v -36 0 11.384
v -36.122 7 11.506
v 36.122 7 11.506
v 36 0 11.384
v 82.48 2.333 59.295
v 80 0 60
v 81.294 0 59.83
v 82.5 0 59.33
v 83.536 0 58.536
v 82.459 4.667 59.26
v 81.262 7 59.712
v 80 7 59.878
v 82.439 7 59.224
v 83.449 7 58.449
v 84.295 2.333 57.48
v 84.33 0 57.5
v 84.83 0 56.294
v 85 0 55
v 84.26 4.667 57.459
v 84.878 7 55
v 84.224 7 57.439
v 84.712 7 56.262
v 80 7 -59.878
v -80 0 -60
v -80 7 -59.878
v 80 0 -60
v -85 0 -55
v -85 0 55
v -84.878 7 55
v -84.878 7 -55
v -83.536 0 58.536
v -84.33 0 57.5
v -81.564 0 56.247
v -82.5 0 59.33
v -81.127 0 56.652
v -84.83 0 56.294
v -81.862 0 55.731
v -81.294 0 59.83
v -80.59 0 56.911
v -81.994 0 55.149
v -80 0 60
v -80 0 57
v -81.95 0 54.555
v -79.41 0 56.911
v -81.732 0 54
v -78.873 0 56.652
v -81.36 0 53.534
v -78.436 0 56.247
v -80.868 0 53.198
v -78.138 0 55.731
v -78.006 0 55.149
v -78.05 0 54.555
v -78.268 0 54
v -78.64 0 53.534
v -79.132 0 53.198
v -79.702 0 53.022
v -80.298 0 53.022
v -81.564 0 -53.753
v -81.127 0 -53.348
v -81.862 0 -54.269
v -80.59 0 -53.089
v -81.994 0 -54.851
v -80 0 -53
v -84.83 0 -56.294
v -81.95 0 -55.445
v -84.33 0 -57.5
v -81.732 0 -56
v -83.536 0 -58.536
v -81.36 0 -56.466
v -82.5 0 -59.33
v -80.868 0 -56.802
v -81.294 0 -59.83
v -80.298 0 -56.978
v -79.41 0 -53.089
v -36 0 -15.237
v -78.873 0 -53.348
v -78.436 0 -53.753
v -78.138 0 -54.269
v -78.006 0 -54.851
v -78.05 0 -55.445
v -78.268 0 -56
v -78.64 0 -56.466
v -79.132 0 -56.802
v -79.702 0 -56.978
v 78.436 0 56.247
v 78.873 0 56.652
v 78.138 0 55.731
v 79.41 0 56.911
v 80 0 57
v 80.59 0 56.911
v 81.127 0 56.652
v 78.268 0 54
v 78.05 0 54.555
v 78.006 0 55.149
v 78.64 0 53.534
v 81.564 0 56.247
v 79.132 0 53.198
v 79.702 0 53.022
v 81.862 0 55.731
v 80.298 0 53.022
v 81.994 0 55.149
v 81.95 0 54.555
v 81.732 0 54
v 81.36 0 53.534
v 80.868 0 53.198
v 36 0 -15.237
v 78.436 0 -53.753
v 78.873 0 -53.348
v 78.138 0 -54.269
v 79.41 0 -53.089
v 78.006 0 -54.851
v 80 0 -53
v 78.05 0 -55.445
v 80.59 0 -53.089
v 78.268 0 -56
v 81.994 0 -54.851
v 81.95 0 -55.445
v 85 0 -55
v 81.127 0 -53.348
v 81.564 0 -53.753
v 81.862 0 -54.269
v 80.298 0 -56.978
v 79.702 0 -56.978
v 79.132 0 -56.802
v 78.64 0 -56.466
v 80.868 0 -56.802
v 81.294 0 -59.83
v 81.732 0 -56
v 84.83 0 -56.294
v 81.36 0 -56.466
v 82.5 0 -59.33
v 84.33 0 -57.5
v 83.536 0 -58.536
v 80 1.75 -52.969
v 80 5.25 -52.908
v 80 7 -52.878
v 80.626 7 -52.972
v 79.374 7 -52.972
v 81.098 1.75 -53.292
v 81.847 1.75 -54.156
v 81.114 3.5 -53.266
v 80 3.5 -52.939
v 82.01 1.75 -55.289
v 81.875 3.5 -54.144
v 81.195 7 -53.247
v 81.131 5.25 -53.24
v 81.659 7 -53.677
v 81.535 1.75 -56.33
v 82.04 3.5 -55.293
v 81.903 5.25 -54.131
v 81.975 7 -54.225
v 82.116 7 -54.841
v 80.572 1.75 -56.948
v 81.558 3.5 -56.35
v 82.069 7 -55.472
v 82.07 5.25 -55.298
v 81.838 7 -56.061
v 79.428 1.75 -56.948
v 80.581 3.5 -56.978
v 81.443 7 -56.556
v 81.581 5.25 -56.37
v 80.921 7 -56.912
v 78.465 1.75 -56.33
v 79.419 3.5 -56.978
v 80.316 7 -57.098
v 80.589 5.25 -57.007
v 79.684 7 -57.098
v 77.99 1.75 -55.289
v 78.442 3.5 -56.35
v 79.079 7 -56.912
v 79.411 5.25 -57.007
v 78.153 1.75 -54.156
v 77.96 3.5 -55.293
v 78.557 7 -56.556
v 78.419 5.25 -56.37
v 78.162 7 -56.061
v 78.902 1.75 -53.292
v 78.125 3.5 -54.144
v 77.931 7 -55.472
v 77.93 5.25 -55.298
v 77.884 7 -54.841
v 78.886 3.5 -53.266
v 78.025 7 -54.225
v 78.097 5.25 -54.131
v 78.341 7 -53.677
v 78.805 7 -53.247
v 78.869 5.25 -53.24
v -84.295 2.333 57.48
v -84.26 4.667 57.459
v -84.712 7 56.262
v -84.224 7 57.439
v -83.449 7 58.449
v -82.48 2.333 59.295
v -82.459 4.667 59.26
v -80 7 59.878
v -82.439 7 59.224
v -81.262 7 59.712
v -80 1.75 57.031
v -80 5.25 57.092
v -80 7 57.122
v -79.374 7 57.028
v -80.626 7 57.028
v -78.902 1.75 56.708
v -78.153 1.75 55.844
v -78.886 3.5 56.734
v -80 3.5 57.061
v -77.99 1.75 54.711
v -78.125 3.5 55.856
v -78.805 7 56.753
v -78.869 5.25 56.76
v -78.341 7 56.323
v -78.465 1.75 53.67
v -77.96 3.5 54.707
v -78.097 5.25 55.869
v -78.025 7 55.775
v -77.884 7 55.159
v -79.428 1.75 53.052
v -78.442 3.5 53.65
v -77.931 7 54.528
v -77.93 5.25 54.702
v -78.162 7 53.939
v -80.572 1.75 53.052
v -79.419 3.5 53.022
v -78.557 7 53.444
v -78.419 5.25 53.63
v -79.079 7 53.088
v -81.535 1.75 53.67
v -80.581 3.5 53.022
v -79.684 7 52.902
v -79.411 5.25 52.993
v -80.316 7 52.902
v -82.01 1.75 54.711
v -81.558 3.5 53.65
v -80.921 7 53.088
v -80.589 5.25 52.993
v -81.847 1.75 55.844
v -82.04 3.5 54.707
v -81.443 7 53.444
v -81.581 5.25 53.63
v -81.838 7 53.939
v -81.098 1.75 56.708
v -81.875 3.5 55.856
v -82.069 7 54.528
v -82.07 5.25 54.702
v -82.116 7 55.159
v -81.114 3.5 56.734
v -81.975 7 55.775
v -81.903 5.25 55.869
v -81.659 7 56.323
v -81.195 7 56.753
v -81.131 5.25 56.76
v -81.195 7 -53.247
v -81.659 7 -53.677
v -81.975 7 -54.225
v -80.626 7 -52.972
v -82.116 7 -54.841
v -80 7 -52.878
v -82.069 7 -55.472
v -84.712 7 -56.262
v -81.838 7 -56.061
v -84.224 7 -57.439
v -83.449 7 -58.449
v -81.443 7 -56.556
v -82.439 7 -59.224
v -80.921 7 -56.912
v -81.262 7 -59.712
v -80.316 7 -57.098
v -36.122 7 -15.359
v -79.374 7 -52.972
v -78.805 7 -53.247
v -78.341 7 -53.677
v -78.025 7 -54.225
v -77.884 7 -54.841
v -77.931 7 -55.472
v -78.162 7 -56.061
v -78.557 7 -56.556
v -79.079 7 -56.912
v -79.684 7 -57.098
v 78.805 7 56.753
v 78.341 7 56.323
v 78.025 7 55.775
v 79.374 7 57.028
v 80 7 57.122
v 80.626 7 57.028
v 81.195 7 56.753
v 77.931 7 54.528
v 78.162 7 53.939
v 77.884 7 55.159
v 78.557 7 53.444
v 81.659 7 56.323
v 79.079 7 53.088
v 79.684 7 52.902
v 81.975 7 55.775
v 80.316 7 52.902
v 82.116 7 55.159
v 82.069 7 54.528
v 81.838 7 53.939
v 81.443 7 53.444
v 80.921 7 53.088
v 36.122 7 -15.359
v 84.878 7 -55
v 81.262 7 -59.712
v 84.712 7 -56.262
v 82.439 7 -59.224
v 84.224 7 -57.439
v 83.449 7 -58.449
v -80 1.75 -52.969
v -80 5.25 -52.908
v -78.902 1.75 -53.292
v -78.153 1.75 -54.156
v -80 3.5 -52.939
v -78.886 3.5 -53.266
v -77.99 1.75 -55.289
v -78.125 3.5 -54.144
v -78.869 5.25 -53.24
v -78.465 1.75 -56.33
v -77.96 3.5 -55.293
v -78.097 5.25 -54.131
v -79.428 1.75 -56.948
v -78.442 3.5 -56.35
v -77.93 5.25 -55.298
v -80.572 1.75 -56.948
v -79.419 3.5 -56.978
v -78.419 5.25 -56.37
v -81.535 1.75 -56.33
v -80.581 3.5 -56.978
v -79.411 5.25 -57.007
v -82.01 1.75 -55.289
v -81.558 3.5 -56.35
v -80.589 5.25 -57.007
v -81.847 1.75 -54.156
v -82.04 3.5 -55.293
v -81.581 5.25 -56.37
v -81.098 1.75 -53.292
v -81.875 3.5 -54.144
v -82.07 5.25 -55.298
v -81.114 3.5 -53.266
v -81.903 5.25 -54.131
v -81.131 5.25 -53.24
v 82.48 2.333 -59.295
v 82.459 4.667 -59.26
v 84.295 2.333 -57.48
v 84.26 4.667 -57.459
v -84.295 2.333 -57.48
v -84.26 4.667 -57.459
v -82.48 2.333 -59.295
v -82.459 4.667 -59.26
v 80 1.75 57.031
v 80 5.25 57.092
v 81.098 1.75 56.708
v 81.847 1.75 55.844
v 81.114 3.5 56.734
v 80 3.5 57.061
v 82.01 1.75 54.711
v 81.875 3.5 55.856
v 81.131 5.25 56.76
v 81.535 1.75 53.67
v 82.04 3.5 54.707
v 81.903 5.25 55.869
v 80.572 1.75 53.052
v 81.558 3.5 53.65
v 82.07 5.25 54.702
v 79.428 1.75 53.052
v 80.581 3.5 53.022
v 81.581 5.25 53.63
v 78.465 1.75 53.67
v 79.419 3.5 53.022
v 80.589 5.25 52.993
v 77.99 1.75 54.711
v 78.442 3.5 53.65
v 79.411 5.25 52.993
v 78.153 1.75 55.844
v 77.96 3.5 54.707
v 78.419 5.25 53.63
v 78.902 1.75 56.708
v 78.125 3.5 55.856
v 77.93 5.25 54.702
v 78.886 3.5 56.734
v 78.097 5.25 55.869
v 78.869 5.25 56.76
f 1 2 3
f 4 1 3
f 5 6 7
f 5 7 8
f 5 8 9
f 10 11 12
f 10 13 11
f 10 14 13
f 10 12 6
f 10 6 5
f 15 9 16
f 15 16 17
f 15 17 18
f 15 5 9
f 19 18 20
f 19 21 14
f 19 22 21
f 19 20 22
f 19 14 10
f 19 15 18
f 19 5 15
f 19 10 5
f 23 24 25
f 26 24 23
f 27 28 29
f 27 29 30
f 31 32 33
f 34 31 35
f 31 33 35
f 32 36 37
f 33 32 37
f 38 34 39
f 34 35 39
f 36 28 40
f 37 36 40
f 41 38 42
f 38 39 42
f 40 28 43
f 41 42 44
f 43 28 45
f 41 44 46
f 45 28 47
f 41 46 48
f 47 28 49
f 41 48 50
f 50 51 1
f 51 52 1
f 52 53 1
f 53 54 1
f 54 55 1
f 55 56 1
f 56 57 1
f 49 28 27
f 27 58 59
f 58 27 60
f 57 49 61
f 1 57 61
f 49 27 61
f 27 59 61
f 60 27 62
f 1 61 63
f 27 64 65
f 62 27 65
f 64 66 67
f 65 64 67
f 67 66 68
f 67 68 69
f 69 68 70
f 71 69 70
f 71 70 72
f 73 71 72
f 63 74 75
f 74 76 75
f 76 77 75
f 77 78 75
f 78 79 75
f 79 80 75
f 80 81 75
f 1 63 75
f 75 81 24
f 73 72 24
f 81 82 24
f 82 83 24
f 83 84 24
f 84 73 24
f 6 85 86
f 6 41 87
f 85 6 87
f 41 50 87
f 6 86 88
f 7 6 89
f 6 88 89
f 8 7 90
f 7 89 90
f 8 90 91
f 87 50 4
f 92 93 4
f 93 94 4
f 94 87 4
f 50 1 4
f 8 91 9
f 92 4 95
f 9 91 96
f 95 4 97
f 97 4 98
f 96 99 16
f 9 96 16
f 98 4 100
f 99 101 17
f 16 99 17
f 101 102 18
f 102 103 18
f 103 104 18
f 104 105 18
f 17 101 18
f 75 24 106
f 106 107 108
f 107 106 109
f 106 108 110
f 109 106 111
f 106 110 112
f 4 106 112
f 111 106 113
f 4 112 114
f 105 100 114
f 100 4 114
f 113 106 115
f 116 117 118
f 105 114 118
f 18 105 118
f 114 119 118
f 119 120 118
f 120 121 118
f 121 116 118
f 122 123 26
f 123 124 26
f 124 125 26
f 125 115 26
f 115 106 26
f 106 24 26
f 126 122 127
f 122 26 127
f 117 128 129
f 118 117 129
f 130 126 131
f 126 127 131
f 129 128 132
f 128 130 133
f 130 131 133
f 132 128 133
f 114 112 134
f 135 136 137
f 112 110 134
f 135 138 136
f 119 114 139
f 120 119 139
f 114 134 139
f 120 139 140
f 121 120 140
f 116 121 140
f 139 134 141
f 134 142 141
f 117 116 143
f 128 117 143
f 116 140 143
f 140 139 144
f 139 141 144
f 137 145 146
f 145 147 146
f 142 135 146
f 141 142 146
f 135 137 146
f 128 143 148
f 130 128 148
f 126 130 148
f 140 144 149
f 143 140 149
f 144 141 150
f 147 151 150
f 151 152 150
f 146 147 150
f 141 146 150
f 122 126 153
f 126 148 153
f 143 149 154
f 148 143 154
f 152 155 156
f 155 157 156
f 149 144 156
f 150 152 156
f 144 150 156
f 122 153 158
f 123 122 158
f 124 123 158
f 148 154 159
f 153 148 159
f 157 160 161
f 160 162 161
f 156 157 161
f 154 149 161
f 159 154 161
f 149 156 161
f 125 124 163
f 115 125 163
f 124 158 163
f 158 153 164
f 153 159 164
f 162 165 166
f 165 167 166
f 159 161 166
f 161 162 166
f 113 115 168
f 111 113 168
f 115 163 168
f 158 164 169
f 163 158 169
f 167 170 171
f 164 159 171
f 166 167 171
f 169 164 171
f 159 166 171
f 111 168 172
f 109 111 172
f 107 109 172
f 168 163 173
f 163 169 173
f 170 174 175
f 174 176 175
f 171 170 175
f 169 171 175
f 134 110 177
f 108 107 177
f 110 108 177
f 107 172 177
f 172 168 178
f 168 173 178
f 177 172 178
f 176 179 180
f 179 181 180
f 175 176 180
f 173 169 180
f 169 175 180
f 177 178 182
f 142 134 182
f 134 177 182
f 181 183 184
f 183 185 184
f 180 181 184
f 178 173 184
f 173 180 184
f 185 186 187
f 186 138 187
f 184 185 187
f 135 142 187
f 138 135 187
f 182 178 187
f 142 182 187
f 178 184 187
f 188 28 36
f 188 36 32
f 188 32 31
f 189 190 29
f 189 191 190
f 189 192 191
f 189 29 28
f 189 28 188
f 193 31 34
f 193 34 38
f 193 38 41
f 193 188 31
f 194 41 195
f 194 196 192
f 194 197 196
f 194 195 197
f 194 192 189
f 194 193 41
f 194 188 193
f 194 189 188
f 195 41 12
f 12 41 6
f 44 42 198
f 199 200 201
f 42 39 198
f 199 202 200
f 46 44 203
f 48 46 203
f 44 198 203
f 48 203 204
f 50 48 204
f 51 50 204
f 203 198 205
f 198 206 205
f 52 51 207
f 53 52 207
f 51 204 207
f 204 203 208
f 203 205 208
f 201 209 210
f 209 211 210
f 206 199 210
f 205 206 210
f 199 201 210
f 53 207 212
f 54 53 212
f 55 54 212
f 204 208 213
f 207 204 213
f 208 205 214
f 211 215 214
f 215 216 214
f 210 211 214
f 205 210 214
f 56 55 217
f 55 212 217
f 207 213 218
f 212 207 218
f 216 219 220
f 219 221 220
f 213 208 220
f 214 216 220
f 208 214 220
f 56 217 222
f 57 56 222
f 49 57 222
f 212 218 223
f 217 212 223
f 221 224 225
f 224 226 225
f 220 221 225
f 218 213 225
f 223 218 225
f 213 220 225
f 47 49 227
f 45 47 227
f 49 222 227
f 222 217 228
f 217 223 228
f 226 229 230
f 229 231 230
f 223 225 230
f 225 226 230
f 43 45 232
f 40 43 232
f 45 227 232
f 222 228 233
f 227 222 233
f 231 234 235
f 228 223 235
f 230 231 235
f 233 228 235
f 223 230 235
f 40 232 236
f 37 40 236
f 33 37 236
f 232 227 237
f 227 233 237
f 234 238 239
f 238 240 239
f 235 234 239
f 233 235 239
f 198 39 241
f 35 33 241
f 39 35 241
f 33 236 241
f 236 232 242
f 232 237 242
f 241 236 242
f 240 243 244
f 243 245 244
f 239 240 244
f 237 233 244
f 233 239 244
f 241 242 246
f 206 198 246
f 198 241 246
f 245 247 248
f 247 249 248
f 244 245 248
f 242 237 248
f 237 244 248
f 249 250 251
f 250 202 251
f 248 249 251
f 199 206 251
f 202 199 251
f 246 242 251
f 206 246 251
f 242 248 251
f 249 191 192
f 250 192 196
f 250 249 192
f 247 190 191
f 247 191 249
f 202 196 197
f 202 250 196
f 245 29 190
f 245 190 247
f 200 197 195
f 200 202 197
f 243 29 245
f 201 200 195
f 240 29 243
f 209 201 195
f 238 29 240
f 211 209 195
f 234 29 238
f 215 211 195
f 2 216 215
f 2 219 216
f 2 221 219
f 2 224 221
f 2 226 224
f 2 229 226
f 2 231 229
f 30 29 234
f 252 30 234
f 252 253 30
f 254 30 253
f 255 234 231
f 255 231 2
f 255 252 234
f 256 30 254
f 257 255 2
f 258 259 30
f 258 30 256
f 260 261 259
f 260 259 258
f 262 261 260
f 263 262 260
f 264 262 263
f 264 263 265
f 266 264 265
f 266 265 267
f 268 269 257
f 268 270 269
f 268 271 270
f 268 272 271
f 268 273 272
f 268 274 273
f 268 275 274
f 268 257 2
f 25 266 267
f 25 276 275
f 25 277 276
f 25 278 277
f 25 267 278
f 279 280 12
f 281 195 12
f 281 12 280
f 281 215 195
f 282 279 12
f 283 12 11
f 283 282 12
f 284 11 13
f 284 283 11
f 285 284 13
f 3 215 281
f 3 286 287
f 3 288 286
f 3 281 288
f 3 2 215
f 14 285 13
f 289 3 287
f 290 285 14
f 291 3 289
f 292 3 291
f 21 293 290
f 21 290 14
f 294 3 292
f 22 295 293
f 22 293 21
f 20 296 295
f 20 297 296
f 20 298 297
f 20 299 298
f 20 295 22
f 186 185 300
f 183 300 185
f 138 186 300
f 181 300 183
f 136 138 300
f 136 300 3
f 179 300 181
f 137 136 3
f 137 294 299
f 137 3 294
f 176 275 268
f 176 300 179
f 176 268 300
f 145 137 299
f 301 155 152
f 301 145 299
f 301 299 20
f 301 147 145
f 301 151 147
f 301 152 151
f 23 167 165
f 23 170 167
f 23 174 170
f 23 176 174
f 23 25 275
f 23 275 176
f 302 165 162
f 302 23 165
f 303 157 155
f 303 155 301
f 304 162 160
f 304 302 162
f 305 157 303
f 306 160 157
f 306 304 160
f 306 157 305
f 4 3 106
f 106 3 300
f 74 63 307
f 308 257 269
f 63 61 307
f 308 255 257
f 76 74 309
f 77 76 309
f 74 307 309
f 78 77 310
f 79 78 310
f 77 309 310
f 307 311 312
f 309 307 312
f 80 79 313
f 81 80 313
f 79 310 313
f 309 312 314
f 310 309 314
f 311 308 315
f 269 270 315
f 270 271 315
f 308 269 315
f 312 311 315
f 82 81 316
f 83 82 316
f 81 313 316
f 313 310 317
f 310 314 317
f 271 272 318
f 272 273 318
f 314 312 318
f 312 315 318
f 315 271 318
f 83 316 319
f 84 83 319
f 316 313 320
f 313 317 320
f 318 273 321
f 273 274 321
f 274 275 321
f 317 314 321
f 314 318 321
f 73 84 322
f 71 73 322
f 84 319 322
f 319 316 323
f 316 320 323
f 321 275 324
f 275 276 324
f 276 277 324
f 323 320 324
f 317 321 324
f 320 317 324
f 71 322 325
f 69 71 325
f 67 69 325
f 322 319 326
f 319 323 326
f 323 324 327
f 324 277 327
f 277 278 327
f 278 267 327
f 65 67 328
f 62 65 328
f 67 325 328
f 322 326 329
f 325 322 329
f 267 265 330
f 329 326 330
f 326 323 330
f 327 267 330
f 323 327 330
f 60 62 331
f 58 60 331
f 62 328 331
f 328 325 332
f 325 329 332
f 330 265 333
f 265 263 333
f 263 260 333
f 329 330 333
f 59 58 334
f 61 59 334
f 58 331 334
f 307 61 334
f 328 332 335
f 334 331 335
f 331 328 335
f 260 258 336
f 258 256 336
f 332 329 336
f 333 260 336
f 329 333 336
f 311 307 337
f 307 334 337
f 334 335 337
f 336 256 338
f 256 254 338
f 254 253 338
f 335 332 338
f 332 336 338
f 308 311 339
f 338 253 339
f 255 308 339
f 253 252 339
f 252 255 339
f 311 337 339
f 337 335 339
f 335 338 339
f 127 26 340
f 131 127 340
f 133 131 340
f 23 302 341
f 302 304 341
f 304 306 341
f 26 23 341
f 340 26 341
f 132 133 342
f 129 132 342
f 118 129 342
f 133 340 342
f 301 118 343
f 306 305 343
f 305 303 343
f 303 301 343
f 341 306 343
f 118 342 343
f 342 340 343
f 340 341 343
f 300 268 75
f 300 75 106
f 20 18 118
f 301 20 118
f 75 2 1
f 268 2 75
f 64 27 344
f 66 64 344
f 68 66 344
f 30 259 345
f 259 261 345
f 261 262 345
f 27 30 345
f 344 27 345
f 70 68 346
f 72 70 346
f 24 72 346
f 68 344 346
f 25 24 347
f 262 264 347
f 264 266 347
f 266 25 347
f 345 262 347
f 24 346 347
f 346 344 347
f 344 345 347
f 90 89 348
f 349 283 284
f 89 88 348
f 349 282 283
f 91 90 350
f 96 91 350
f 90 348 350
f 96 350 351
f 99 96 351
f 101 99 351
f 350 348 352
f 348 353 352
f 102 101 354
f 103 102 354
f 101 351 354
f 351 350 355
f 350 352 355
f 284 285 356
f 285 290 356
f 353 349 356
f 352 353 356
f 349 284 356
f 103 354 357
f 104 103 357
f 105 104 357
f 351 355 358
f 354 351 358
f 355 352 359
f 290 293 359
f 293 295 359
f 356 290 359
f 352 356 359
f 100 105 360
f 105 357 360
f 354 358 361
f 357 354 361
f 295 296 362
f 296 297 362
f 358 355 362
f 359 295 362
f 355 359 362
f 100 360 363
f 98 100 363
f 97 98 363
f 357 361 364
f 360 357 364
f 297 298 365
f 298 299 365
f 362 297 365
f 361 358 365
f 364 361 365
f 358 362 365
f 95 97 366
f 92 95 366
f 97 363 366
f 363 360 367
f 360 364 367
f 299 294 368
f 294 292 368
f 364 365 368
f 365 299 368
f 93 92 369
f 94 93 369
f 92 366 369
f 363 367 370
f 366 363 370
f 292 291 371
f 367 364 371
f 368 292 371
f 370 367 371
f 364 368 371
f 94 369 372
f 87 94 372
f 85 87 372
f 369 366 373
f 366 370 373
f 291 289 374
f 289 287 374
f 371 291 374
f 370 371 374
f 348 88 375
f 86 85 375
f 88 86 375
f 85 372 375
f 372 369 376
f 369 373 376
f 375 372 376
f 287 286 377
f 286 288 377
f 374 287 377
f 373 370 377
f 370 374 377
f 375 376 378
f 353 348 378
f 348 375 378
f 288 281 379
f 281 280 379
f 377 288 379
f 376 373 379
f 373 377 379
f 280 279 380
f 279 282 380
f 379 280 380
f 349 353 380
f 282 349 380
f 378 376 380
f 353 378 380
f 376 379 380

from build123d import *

# Parameters (mm, degrees)
SKETCH1_W           = 170
SKETCH1_H           = 120
BOSS_EXTRUDE1_DEPTH = 7
SKETCH2_W           = 72
SKETCH2_H           = 26.620567464
CUT_EXTRUDE1_DEPTH  = 7
SKETCH3_R           = 2
CUT_EXTRUDE5_DEPTH  = 7
SKETCH7_R           = 2
CUT_EXTRUDE7_DEPTH  = 10
SKETCH6_R           = 2
CUT_EXTRUDE10_DEPTH = 10
SKETCH9_R           = 2
CUT_EXTRUDE11_DEPTH = 10
FILLET1_R           = 5
DRAFT1_ANGLE        = 1


with BuildPart() as part:
    # Sketch1 → Boss-Extrude1 (new body)
    with BuildSketch(Plane(origin=(0, 0, 0), x_dir=(1, 0, 0), z_dir=(0, 1, 0))):
        Rectangle(SKETCH1_W, SKETCH1_H)
    extrude(amount=BOSS_EXTRUDE1_DEPTH)

    # Sketch2 → Cut-Extrude1 (cut)
    with BuildSketch(Plane(origin=(0, 7, 0), x_dir=(1, 0, 0), z_dir=(0, 1, 0))):
        with Locations((0, 1.926488435)):
            Rectangle(SKETCH2_W, SKETCH2_H)
    extrude(amount=-CUT_EXTRUDE1_DEPTH, mode=Mode.SUBTRACT)

    # Sketch3 → Cut-Extrude5 (cut)
    with BuildSketch(Plane(origin=(0, 7, 0), x_dir=(1, 0, 0), z_dir=(0, 1, 0))):
        with Locations(Location((-80, 55, 0), (0, 0, 270))):
            Circle(SKETCH3_R)
    extrude(amount=-CUT_EXTRUDE5_DEPTH, mode=Mode.SUBTRACT)

    # Sketch7 → Cut-Extrude7 (cut)
    with BuildSketch(Plane(origin=(0, 7, 0), x_dir=(1, 0, 0), z_dir=(0, 1, 0))):
        with Locations(Location((-80, -55, 0), (0, 0, 270))):
            Circle(SKETCH7_R)
    extrude(amount=-CUT_EXTRUDE7_DEPTH, mode=Mode.SUBTRACT)

    # Sketch6 → Cut-Extrude10 (cut)
    with BuildSketch(Plane(origin=(0, 7, 0), x_dir=(1, 0, 0), z_dir=(0, 1, 0))):
        with Locations(Location((80, 55, 0), (0, 0, 270))):
            Circle(SKETCH6_R)
    extrude(amount=-CUT_EXTRUDE10_DEPTH, mode=Mode.SUBTRACT)

    # Sketch9 → Cut-Extrude11 (cut)
    with BuildSketch(Plane(origin=(0, 7, 0), x_dir=(1, 0, 0), z_dir=(0, 1, 0))):
        with Locations(Location((80, -55, 0), (0, 0, 270))):
            Circle(SKETCH9_R)
    extrude(amount=-CUT_EXTRUDE11_DEPTH, mode=Mode.SUBTRACT)

    # Fillet1
    fillet1_edges = [part.edges().sort_by_distance(p)[0] for p in [
        (-85, 3.5, -60),
        (85, 3.5, -60),
        (85, 3.5, 60),
        (-85, 3.5, 60),
    ]]
    fillet(fillet1_edges, radius=FILLET1_R)

    # Draft1
    draft1_faces = [part.faces().sort_by_distance(p)[0] for p in [
        (-83.535533906, 3.5, 58.535533906),
        (-85, 3.5, 0),
        (-83.535533906, 3.5, -58.535533906),
        (0, 3.5, -60),
        (83.535533906, 3.5, -58.535533906),
        (85, 3.5, 0),
        (83.535533906, 3.5, 58.535533906),
        (0, 3.5, 60),
        (-80, 3.5, 53),
        (80, 3.5, 53),
        (80, 3.5, -57),
        (-80, 3.5, -57),
        (-36, 3.5, -1.926488435),
        (0, 3.5, -15.236772167),
        (36, 3.5, -1.926488435),
        (0, 3.5, 11.383795297),
    ]]
    draft(draft1_faces, Plane.ZX, DRAFT1_ANGLE)


solid = part.part
